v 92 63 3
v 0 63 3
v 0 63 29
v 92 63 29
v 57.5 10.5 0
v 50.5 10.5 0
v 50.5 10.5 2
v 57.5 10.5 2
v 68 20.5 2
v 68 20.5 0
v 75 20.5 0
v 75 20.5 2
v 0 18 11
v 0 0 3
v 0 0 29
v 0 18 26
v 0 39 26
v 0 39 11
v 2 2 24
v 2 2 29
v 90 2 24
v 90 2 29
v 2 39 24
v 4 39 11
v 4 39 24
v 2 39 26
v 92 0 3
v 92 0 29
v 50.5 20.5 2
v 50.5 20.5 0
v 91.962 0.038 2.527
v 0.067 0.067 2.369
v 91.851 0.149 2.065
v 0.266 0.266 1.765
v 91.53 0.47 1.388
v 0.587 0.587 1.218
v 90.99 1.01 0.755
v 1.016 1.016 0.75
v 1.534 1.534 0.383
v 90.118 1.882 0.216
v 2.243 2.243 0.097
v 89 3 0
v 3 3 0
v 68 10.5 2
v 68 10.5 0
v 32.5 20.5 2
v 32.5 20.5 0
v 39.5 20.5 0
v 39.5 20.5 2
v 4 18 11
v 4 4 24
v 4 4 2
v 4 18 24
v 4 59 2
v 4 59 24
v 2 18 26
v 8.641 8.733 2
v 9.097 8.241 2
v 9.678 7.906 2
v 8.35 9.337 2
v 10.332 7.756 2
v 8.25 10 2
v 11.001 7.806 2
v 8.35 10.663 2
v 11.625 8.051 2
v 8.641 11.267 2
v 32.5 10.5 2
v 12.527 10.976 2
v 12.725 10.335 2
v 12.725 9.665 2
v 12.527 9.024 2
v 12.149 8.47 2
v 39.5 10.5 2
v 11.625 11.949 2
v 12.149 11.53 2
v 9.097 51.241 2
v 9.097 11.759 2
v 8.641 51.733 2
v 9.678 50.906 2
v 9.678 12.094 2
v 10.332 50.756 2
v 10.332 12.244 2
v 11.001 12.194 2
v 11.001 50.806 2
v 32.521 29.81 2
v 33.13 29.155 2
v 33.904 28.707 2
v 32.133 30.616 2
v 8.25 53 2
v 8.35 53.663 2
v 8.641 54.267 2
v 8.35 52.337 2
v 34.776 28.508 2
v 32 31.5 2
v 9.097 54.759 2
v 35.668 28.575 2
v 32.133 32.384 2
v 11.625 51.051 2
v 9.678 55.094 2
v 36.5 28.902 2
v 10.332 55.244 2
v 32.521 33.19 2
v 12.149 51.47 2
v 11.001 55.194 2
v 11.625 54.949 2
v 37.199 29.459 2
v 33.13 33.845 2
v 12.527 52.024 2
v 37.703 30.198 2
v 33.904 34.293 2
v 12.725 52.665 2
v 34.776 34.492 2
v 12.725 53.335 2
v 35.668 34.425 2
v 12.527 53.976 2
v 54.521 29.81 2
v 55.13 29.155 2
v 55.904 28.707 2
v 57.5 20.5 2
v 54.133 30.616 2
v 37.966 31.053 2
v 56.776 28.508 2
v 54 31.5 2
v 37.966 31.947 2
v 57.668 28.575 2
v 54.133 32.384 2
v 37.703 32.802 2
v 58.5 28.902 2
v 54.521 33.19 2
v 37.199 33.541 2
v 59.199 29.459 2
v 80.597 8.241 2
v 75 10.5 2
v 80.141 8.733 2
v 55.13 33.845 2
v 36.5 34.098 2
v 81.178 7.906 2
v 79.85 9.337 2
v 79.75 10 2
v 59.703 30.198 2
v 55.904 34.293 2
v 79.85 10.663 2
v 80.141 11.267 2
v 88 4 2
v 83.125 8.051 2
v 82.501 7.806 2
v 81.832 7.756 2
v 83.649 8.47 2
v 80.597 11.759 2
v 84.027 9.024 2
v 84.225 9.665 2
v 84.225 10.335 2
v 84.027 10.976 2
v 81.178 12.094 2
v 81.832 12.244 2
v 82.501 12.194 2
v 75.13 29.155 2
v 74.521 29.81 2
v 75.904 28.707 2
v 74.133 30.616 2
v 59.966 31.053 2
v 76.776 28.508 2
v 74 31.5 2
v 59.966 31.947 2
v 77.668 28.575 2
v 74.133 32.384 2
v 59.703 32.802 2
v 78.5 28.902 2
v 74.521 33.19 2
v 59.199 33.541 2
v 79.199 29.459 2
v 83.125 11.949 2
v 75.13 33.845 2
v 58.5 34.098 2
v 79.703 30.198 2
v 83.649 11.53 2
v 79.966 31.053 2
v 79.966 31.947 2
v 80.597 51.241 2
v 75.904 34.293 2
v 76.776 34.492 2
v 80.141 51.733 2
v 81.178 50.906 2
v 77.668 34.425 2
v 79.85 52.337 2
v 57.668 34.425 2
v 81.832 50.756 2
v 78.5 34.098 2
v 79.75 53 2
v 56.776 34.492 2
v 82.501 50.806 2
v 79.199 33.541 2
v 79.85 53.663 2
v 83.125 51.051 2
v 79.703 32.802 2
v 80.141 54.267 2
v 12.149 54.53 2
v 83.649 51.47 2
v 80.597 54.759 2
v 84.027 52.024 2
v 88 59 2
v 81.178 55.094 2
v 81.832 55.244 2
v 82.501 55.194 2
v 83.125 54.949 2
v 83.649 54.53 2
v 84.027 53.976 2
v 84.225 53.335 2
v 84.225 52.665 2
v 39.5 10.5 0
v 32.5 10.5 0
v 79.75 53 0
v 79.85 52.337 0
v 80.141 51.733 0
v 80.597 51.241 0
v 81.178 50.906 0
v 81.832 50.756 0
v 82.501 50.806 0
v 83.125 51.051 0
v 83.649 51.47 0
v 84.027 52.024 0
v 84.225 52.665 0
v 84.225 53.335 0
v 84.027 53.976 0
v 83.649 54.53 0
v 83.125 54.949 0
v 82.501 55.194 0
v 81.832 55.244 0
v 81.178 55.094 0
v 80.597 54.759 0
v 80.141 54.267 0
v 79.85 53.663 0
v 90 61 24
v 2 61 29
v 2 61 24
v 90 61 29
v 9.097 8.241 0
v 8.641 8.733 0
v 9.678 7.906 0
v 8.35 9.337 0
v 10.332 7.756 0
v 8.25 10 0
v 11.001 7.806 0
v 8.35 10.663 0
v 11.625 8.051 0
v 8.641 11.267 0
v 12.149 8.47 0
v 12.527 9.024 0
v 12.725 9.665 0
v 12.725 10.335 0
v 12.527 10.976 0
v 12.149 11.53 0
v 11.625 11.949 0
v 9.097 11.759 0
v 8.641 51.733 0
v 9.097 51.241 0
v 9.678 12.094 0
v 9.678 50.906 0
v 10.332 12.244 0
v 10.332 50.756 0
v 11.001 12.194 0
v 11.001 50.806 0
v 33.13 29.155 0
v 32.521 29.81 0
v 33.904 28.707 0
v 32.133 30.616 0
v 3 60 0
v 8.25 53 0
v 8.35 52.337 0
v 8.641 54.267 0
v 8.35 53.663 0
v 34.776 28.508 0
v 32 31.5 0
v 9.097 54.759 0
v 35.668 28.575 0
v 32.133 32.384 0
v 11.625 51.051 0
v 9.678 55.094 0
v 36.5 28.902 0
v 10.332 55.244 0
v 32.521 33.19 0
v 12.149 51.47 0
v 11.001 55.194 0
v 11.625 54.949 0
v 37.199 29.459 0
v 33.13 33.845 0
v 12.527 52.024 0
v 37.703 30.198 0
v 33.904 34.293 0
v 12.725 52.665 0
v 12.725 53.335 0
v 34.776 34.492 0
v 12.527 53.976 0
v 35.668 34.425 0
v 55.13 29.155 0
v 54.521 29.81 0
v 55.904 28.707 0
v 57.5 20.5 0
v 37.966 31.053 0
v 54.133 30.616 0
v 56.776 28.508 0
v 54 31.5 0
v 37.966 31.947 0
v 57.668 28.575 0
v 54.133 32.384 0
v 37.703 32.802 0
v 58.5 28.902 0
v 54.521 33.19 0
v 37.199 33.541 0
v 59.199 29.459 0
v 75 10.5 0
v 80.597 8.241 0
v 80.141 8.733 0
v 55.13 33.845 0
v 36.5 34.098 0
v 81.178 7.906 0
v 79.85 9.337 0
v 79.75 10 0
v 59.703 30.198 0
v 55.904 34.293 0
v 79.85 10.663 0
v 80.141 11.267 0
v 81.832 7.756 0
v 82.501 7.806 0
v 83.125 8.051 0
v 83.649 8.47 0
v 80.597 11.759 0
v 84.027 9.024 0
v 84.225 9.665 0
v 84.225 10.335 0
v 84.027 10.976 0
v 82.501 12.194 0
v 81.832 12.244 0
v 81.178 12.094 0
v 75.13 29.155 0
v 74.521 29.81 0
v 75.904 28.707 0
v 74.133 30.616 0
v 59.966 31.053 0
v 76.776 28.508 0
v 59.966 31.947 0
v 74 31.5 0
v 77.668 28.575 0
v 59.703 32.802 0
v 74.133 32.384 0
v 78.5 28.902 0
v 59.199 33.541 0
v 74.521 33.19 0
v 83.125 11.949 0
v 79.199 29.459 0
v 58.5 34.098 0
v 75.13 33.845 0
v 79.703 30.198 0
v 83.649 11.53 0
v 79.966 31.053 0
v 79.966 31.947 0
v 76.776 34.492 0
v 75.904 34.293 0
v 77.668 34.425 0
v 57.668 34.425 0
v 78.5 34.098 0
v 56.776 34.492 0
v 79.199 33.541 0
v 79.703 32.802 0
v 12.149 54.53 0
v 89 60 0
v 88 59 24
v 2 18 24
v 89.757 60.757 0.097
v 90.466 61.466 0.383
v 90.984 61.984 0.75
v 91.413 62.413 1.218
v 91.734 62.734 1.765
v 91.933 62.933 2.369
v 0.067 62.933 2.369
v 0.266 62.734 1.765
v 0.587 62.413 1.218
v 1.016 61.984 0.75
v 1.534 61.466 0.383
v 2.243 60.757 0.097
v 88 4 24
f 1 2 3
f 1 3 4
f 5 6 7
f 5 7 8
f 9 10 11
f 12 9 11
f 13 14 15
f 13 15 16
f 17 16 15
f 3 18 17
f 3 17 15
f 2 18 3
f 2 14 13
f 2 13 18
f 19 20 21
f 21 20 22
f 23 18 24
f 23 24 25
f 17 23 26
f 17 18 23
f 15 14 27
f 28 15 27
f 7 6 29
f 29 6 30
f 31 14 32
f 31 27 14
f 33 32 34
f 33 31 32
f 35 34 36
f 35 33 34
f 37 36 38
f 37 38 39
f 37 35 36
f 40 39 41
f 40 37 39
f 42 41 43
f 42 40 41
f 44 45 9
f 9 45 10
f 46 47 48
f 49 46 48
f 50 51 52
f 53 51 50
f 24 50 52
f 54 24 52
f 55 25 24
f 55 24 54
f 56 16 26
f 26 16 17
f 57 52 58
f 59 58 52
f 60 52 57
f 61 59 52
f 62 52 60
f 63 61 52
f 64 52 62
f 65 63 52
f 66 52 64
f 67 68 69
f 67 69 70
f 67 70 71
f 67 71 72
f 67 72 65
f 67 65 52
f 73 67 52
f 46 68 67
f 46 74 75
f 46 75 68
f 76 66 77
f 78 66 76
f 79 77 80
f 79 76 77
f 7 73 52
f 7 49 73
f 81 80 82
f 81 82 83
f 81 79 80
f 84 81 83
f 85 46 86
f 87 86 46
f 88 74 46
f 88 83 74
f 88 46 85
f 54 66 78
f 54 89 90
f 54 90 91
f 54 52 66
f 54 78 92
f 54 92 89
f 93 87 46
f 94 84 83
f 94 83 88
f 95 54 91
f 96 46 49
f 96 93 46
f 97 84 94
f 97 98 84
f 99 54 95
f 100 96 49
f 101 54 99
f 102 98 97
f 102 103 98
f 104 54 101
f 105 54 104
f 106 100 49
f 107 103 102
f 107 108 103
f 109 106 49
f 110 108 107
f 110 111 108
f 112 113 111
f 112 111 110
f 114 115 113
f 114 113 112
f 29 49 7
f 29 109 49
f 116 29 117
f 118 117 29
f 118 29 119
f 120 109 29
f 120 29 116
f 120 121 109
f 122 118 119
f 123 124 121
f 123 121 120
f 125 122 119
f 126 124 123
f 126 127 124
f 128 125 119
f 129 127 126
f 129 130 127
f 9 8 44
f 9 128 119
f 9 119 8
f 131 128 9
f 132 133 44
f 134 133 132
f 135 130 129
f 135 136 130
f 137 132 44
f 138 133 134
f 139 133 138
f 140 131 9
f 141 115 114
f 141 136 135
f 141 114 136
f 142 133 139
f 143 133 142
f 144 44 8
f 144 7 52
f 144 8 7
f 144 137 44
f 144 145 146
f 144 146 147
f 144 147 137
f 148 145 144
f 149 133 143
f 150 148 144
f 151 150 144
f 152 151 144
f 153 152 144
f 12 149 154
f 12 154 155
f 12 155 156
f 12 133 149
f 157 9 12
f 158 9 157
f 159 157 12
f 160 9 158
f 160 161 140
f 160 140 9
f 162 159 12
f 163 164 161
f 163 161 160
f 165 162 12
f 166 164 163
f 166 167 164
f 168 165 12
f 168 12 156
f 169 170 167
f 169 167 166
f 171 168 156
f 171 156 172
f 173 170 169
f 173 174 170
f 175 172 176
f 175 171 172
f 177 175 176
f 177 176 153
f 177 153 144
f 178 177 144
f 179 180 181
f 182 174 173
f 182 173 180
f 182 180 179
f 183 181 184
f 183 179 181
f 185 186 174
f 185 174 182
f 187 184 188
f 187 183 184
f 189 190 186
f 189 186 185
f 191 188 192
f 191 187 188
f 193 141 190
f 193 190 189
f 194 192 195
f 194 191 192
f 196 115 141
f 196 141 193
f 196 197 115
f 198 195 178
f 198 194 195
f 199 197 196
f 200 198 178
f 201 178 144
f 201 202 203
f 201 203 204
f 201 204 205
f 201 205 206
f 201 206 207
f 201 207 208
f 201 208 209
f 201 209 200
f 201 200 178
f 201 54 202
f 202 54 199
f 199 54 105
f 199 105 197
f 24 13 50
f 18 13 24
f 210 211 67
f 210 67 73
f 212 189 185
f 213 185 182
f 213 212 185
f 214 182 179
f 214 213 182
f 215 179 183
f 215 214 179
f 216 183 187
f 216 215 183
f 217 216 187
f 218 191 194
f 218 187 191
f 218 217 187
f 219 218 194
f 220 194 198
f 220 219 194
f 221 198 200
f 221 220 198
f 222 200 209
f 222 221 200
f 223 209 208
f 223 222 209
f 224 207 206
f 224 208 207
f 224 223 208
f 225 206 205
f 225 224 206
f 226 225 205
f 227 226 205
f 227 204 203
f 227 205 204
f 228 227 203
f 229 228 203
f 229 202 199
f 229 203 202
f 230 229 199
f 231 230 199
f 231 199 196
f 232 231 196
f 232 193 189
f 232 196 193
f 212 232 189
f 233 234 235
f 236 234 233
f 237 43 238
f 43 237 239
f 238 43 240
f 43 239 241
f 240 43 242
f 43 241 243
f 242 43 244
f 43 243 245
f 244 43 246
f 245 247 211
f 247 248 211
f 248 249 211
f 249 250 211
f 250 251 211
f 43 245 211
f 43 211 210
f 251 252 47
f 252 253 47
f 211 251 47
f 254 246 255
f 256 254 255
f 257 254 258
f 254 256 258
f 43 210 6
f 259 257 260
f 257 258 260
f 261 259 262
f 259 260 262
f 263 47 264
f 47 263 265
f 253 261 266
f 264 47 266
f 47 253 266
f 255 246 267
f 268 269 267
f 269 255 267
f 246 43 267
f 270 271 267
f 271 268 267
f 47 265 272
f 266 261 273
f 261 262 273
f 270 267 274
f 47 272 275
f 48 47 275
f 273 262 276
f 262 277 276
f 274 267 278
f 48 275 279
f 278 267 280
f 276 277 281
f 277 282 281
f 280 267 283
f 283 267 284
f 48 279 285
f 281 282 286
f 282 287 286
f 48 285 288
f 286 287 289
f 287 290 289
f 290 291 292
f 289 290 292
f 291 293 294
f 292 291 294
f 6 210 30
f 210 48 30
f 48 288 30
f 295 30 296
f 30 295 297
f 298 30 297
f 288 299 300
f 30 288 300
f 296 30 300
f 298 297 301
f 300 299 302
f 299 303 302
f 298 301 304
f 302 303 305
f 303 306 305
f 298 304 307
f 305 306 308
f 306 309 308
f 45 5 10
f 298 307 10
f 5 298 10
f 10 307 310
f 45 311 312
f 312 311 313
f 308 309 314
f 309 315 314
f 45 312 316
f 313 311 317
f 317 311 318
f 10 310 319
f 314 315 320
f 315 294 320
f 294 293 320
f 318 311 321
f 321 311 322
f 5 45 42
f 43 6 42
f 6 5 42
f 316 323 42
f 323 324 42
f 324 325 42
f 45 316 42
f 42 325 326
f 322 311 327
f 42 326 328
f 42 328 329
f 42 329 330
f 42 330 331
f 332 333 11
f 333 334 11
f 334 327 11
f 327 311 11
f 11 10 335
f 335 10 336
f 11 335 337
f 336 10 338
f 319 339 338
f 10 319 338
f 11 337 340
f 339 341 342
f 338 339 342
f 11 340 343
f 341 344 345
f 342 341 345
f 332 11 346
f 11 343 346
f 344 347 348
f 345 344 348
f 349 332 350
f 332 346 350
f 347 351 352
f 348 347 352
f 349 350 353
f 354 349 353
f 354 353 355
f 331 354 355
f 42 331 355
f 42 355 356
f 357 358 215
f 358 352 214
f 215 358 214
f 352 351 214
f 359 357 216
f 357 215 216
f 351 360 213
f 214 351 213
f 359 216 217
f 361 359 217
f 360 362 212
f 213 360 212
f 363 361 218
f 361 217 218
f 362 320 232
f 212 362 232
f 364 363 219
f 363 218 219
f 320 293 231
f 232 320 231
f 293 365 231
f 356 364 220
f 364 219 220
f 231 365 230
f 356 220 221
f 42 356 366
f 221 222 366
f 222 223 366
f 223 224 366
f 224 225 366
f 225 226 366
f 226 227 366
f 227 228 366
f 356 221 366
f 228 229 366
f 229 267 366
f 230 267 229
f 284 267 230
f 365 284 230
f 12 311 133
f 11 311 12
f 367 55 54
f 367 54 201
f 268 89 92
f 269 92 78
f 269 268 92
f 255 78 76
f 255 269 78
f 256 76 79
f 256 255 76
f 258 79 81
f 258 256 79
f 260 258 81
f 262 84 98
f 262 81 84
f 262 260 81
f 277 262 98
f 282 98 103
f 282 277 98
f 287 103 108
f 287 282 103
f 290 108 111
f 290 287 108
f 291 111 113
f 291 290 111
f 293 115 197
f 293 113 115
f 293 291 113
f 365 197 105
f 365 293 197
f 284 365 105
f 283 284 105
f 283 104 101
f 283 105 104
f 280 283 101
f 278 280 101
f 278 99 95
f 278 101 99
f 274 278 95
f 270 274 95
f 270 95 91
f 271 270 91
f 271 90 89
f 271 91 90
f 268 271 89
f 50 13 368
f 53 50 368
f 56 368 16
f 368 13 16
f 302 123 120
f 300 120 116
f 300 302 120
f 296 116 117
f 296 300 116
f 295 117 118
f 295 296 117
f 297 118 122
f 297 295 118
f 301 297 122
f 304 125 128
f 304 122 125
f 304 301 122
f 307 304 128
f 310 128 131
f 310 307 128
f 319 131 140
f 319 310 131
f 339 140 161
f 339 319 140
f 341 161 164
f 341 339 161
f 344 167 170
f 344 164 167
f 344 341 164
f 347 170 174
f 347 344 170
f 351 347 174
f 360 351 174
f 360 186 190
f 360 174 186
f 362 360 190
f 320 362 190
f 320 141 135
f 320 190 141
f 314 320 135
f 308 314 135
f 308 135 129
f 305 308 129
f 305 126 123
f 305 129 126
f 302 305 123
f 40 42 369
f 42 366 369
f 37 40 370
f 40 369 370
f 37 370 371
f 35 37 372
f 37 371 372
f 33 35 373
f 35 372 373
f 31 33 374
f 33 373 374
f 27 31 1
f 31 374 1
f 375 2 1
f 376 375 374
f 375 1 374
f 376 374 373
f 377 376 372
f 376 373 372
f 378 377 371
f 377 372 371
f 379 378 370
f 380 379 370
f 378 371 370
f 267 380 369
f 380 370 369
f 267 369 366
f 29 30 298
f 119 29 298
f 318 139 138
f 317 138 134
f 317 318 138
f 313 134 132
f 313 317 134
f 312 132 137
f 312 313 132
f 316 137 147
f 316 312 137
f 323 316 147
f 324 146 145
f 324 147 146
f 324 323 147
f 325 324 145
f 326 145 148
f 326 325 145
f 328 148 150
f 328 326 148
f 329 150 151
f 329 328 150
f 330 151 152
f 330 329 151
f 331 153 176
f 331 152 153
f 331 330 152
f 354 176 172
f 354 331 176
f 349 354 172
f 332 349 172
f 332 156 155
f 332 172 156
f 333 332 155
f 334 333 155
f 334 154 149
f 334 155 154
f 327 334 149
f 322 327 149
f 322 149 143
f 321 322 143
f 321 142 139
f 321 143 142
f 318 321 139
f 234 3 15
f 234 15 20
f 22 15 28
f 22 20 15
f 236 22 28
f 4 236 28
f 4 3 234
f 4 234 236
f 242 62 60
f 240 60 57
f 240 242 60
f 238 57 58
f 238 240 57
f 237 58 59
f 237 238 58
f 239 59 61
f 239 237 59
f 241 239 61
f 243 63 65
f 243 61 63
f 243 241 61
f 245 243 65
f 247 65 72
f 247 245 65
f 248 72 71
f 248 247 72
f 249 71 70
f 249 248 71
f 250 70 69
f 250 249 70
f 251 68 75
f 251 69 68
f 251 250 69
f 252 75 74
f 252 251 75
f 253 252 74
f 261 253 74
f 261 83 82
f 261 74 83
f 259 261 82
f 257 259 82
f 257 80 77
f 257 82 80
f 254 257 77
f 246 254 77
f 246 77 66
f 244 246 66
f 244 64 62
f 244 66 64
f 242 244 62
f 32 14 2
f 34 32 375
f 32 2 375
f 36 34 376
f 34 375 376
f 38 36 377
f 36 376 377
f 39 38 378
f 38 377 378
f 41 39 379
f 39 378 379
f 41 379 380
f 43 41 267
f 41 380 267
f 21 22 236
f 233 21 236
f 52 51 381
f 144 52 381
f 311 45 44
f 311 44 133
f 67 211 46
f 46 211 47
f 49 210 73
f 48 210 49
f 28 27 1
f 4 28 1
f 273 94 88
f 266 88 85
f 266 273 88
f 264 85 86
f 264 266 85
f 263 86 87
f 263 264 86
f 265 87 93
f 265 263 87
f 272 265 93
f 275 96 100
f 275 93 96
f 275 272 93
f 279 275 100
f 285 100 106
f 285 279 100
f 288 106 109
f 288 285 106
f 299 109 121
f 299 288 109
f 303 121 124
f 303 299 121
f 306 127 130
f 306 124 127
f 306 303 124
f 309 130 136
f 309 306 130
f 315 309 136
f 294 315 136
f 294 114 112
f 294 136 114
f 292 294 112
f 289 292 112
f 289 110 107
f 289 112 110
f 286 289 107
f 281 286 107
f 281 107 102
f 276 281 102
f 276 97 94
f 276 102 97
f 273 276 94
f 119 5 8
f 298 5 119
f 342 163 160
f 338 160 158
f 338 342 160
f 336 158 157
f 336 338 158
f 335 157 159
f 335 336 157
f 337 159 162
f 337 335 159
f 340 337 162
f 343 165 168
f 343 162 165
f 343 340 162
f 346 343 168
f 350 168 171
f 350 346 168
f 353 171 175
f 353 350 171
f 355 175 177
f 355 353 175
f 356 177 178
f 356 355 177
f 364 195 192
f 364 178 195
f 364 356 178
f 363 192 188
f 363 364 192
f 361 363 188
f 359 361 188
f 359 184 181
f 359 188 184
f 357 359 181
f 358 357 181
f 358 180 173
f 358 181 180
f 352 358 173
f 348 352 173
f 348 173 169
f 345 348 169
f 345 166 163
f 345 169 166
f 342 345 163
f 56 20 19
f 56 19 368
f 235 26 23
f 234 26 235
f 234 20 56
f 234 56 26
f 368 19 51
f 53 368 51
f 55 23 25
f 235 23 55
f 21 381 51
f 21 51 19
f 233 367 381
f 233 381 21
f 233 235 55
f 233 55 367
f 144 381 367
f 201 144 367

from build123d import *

# Parameters (mm, degrees)
SKETCH3_W           = 92
SKETCH3_H           = 63
SKETCH3_R           = 3
SKETCH3_R_2         = 2.25
SKETCH3_W_2         = 7
SKETCH3_H_2         = 10
BOSS_EXTRUDE3_DEPTH = 29
SKETCH4_W           = 84
SKETCH4_H           = 55
CUT_EXTRUDE1_DEPTH  = 27
SKETCH5_W           = 88
SKETCH5_H           = 59
CUT_EXTRUDE2_DEPTH  = 5
FILLET1_R           = 3
SKETCH6_W           = 15
SKETCH6_H           = 21
CUT_EXTRUDE3_DEPTH  = 5


with BuildPart() as part:
    # Sketch3 → Boss-Extrude3 (new body)
    with BuildSketch(Plane.XY):
        with Locations((46, 31.5)):
            Rectangle(SKETCH3_W, SKETCH3_H)
        with Locations(Location((35, 31.5, 0), (0, 0, 180))):
            Circle(SKETCH3_R, mode=Mode.SUBTRACT)
        with Locations(Location((57, 31.5, 0), (0, 0, 180))):
            Circle(SKETCH3_R, mode=Mode.SUBTRACT)
        with Locations(Location((77, 31.5, 0), (0, 0, 180))):
            Circle(SKETCH3_R, mode=Mode.SUBTRACT)
        with Locations(Location((82, 53, 0), (0, 0, 180))):
            Circle(SKETCH3_R_2, mode=Mode.SUBTRACT)
        with Locations(Location((82, 10, 0), (0, 0, 180))):
            Circle(SKETCH3_R_2, mode=Mode.SUBTRACT)
        with Locations(Location((10.5, 10, 0), (0, 0, 180))):
            Circle(SKETCH3_R_2, mode=Mode.SUBTRACT)
        with Locations(Location((10.5, 53, 0), (0, 0, 180))):
            Circle(SKETCH3_R_2, mode=Mode.SUBTRACT)
        with Locations((71.5, 15.5)):
            Rectangle(SKETCH3_W_2, SKETCH3_H_2, mode=Mode.SUBTRACT)
        with Locations((54, 15.5)):
            Rectangle(SKETCH3_W_2, SKETCH3_H_2, mode=Mode.SUBTRACT)
        with Locations((36, 15.5)):
            Rectangle(SKETCH3_W_2, SKETCH3_H_2, mode=Mode.SUBTRACT)
    extrude(amount=BOSS_EXTRUDE3_DEPTH)

    # Sketch4 → Cut-Extrude1 (cut)
    with BuildSketch(Plane.XY.offset(29)):
        with Locations((46, 31.5)):
            Rectangle(SKETCH4_W, SKETCH4_H)
    extrude(amount=-CUT_EXTRUDE1_DEPTH, mode=Mode.SUBTRACT)

    # Sketch5 → Cut-Extrude2 (cut)
    with BuildSketch(Plane.XY.offset(29)):
        with Locations((46, 31.5)):
            Rectangle(SKETCH5_W, SKETCH5_H)
    extrude(amount=-CUT_EXTRUDE2_DEPTH, mode=Mode.SUBTRACT)

    # Fillet1
    fillet1_edges = [part.edges().sort_by_distance(p)[0] for p in [
        (0, 31.5, 0),
        (46, 63, 0),
        (92, 31.5, 0),
        (46, 0, 0),
    ]]
    fillet(fillet1_edges, radius=FILLET1_R)

    # Sketch6 → Cut-Extrude3 (cut)
    with BuildSketch(Plane.ZY):
        with Locations((18.5, 28.5)):
            Rectangle(SKETCH6_W, SKETCH6_H)
    extrude(amount=-CUT_EXTRUDE3_DEPTH, mode=Mode.SUBTRACT)


solid = part.part
